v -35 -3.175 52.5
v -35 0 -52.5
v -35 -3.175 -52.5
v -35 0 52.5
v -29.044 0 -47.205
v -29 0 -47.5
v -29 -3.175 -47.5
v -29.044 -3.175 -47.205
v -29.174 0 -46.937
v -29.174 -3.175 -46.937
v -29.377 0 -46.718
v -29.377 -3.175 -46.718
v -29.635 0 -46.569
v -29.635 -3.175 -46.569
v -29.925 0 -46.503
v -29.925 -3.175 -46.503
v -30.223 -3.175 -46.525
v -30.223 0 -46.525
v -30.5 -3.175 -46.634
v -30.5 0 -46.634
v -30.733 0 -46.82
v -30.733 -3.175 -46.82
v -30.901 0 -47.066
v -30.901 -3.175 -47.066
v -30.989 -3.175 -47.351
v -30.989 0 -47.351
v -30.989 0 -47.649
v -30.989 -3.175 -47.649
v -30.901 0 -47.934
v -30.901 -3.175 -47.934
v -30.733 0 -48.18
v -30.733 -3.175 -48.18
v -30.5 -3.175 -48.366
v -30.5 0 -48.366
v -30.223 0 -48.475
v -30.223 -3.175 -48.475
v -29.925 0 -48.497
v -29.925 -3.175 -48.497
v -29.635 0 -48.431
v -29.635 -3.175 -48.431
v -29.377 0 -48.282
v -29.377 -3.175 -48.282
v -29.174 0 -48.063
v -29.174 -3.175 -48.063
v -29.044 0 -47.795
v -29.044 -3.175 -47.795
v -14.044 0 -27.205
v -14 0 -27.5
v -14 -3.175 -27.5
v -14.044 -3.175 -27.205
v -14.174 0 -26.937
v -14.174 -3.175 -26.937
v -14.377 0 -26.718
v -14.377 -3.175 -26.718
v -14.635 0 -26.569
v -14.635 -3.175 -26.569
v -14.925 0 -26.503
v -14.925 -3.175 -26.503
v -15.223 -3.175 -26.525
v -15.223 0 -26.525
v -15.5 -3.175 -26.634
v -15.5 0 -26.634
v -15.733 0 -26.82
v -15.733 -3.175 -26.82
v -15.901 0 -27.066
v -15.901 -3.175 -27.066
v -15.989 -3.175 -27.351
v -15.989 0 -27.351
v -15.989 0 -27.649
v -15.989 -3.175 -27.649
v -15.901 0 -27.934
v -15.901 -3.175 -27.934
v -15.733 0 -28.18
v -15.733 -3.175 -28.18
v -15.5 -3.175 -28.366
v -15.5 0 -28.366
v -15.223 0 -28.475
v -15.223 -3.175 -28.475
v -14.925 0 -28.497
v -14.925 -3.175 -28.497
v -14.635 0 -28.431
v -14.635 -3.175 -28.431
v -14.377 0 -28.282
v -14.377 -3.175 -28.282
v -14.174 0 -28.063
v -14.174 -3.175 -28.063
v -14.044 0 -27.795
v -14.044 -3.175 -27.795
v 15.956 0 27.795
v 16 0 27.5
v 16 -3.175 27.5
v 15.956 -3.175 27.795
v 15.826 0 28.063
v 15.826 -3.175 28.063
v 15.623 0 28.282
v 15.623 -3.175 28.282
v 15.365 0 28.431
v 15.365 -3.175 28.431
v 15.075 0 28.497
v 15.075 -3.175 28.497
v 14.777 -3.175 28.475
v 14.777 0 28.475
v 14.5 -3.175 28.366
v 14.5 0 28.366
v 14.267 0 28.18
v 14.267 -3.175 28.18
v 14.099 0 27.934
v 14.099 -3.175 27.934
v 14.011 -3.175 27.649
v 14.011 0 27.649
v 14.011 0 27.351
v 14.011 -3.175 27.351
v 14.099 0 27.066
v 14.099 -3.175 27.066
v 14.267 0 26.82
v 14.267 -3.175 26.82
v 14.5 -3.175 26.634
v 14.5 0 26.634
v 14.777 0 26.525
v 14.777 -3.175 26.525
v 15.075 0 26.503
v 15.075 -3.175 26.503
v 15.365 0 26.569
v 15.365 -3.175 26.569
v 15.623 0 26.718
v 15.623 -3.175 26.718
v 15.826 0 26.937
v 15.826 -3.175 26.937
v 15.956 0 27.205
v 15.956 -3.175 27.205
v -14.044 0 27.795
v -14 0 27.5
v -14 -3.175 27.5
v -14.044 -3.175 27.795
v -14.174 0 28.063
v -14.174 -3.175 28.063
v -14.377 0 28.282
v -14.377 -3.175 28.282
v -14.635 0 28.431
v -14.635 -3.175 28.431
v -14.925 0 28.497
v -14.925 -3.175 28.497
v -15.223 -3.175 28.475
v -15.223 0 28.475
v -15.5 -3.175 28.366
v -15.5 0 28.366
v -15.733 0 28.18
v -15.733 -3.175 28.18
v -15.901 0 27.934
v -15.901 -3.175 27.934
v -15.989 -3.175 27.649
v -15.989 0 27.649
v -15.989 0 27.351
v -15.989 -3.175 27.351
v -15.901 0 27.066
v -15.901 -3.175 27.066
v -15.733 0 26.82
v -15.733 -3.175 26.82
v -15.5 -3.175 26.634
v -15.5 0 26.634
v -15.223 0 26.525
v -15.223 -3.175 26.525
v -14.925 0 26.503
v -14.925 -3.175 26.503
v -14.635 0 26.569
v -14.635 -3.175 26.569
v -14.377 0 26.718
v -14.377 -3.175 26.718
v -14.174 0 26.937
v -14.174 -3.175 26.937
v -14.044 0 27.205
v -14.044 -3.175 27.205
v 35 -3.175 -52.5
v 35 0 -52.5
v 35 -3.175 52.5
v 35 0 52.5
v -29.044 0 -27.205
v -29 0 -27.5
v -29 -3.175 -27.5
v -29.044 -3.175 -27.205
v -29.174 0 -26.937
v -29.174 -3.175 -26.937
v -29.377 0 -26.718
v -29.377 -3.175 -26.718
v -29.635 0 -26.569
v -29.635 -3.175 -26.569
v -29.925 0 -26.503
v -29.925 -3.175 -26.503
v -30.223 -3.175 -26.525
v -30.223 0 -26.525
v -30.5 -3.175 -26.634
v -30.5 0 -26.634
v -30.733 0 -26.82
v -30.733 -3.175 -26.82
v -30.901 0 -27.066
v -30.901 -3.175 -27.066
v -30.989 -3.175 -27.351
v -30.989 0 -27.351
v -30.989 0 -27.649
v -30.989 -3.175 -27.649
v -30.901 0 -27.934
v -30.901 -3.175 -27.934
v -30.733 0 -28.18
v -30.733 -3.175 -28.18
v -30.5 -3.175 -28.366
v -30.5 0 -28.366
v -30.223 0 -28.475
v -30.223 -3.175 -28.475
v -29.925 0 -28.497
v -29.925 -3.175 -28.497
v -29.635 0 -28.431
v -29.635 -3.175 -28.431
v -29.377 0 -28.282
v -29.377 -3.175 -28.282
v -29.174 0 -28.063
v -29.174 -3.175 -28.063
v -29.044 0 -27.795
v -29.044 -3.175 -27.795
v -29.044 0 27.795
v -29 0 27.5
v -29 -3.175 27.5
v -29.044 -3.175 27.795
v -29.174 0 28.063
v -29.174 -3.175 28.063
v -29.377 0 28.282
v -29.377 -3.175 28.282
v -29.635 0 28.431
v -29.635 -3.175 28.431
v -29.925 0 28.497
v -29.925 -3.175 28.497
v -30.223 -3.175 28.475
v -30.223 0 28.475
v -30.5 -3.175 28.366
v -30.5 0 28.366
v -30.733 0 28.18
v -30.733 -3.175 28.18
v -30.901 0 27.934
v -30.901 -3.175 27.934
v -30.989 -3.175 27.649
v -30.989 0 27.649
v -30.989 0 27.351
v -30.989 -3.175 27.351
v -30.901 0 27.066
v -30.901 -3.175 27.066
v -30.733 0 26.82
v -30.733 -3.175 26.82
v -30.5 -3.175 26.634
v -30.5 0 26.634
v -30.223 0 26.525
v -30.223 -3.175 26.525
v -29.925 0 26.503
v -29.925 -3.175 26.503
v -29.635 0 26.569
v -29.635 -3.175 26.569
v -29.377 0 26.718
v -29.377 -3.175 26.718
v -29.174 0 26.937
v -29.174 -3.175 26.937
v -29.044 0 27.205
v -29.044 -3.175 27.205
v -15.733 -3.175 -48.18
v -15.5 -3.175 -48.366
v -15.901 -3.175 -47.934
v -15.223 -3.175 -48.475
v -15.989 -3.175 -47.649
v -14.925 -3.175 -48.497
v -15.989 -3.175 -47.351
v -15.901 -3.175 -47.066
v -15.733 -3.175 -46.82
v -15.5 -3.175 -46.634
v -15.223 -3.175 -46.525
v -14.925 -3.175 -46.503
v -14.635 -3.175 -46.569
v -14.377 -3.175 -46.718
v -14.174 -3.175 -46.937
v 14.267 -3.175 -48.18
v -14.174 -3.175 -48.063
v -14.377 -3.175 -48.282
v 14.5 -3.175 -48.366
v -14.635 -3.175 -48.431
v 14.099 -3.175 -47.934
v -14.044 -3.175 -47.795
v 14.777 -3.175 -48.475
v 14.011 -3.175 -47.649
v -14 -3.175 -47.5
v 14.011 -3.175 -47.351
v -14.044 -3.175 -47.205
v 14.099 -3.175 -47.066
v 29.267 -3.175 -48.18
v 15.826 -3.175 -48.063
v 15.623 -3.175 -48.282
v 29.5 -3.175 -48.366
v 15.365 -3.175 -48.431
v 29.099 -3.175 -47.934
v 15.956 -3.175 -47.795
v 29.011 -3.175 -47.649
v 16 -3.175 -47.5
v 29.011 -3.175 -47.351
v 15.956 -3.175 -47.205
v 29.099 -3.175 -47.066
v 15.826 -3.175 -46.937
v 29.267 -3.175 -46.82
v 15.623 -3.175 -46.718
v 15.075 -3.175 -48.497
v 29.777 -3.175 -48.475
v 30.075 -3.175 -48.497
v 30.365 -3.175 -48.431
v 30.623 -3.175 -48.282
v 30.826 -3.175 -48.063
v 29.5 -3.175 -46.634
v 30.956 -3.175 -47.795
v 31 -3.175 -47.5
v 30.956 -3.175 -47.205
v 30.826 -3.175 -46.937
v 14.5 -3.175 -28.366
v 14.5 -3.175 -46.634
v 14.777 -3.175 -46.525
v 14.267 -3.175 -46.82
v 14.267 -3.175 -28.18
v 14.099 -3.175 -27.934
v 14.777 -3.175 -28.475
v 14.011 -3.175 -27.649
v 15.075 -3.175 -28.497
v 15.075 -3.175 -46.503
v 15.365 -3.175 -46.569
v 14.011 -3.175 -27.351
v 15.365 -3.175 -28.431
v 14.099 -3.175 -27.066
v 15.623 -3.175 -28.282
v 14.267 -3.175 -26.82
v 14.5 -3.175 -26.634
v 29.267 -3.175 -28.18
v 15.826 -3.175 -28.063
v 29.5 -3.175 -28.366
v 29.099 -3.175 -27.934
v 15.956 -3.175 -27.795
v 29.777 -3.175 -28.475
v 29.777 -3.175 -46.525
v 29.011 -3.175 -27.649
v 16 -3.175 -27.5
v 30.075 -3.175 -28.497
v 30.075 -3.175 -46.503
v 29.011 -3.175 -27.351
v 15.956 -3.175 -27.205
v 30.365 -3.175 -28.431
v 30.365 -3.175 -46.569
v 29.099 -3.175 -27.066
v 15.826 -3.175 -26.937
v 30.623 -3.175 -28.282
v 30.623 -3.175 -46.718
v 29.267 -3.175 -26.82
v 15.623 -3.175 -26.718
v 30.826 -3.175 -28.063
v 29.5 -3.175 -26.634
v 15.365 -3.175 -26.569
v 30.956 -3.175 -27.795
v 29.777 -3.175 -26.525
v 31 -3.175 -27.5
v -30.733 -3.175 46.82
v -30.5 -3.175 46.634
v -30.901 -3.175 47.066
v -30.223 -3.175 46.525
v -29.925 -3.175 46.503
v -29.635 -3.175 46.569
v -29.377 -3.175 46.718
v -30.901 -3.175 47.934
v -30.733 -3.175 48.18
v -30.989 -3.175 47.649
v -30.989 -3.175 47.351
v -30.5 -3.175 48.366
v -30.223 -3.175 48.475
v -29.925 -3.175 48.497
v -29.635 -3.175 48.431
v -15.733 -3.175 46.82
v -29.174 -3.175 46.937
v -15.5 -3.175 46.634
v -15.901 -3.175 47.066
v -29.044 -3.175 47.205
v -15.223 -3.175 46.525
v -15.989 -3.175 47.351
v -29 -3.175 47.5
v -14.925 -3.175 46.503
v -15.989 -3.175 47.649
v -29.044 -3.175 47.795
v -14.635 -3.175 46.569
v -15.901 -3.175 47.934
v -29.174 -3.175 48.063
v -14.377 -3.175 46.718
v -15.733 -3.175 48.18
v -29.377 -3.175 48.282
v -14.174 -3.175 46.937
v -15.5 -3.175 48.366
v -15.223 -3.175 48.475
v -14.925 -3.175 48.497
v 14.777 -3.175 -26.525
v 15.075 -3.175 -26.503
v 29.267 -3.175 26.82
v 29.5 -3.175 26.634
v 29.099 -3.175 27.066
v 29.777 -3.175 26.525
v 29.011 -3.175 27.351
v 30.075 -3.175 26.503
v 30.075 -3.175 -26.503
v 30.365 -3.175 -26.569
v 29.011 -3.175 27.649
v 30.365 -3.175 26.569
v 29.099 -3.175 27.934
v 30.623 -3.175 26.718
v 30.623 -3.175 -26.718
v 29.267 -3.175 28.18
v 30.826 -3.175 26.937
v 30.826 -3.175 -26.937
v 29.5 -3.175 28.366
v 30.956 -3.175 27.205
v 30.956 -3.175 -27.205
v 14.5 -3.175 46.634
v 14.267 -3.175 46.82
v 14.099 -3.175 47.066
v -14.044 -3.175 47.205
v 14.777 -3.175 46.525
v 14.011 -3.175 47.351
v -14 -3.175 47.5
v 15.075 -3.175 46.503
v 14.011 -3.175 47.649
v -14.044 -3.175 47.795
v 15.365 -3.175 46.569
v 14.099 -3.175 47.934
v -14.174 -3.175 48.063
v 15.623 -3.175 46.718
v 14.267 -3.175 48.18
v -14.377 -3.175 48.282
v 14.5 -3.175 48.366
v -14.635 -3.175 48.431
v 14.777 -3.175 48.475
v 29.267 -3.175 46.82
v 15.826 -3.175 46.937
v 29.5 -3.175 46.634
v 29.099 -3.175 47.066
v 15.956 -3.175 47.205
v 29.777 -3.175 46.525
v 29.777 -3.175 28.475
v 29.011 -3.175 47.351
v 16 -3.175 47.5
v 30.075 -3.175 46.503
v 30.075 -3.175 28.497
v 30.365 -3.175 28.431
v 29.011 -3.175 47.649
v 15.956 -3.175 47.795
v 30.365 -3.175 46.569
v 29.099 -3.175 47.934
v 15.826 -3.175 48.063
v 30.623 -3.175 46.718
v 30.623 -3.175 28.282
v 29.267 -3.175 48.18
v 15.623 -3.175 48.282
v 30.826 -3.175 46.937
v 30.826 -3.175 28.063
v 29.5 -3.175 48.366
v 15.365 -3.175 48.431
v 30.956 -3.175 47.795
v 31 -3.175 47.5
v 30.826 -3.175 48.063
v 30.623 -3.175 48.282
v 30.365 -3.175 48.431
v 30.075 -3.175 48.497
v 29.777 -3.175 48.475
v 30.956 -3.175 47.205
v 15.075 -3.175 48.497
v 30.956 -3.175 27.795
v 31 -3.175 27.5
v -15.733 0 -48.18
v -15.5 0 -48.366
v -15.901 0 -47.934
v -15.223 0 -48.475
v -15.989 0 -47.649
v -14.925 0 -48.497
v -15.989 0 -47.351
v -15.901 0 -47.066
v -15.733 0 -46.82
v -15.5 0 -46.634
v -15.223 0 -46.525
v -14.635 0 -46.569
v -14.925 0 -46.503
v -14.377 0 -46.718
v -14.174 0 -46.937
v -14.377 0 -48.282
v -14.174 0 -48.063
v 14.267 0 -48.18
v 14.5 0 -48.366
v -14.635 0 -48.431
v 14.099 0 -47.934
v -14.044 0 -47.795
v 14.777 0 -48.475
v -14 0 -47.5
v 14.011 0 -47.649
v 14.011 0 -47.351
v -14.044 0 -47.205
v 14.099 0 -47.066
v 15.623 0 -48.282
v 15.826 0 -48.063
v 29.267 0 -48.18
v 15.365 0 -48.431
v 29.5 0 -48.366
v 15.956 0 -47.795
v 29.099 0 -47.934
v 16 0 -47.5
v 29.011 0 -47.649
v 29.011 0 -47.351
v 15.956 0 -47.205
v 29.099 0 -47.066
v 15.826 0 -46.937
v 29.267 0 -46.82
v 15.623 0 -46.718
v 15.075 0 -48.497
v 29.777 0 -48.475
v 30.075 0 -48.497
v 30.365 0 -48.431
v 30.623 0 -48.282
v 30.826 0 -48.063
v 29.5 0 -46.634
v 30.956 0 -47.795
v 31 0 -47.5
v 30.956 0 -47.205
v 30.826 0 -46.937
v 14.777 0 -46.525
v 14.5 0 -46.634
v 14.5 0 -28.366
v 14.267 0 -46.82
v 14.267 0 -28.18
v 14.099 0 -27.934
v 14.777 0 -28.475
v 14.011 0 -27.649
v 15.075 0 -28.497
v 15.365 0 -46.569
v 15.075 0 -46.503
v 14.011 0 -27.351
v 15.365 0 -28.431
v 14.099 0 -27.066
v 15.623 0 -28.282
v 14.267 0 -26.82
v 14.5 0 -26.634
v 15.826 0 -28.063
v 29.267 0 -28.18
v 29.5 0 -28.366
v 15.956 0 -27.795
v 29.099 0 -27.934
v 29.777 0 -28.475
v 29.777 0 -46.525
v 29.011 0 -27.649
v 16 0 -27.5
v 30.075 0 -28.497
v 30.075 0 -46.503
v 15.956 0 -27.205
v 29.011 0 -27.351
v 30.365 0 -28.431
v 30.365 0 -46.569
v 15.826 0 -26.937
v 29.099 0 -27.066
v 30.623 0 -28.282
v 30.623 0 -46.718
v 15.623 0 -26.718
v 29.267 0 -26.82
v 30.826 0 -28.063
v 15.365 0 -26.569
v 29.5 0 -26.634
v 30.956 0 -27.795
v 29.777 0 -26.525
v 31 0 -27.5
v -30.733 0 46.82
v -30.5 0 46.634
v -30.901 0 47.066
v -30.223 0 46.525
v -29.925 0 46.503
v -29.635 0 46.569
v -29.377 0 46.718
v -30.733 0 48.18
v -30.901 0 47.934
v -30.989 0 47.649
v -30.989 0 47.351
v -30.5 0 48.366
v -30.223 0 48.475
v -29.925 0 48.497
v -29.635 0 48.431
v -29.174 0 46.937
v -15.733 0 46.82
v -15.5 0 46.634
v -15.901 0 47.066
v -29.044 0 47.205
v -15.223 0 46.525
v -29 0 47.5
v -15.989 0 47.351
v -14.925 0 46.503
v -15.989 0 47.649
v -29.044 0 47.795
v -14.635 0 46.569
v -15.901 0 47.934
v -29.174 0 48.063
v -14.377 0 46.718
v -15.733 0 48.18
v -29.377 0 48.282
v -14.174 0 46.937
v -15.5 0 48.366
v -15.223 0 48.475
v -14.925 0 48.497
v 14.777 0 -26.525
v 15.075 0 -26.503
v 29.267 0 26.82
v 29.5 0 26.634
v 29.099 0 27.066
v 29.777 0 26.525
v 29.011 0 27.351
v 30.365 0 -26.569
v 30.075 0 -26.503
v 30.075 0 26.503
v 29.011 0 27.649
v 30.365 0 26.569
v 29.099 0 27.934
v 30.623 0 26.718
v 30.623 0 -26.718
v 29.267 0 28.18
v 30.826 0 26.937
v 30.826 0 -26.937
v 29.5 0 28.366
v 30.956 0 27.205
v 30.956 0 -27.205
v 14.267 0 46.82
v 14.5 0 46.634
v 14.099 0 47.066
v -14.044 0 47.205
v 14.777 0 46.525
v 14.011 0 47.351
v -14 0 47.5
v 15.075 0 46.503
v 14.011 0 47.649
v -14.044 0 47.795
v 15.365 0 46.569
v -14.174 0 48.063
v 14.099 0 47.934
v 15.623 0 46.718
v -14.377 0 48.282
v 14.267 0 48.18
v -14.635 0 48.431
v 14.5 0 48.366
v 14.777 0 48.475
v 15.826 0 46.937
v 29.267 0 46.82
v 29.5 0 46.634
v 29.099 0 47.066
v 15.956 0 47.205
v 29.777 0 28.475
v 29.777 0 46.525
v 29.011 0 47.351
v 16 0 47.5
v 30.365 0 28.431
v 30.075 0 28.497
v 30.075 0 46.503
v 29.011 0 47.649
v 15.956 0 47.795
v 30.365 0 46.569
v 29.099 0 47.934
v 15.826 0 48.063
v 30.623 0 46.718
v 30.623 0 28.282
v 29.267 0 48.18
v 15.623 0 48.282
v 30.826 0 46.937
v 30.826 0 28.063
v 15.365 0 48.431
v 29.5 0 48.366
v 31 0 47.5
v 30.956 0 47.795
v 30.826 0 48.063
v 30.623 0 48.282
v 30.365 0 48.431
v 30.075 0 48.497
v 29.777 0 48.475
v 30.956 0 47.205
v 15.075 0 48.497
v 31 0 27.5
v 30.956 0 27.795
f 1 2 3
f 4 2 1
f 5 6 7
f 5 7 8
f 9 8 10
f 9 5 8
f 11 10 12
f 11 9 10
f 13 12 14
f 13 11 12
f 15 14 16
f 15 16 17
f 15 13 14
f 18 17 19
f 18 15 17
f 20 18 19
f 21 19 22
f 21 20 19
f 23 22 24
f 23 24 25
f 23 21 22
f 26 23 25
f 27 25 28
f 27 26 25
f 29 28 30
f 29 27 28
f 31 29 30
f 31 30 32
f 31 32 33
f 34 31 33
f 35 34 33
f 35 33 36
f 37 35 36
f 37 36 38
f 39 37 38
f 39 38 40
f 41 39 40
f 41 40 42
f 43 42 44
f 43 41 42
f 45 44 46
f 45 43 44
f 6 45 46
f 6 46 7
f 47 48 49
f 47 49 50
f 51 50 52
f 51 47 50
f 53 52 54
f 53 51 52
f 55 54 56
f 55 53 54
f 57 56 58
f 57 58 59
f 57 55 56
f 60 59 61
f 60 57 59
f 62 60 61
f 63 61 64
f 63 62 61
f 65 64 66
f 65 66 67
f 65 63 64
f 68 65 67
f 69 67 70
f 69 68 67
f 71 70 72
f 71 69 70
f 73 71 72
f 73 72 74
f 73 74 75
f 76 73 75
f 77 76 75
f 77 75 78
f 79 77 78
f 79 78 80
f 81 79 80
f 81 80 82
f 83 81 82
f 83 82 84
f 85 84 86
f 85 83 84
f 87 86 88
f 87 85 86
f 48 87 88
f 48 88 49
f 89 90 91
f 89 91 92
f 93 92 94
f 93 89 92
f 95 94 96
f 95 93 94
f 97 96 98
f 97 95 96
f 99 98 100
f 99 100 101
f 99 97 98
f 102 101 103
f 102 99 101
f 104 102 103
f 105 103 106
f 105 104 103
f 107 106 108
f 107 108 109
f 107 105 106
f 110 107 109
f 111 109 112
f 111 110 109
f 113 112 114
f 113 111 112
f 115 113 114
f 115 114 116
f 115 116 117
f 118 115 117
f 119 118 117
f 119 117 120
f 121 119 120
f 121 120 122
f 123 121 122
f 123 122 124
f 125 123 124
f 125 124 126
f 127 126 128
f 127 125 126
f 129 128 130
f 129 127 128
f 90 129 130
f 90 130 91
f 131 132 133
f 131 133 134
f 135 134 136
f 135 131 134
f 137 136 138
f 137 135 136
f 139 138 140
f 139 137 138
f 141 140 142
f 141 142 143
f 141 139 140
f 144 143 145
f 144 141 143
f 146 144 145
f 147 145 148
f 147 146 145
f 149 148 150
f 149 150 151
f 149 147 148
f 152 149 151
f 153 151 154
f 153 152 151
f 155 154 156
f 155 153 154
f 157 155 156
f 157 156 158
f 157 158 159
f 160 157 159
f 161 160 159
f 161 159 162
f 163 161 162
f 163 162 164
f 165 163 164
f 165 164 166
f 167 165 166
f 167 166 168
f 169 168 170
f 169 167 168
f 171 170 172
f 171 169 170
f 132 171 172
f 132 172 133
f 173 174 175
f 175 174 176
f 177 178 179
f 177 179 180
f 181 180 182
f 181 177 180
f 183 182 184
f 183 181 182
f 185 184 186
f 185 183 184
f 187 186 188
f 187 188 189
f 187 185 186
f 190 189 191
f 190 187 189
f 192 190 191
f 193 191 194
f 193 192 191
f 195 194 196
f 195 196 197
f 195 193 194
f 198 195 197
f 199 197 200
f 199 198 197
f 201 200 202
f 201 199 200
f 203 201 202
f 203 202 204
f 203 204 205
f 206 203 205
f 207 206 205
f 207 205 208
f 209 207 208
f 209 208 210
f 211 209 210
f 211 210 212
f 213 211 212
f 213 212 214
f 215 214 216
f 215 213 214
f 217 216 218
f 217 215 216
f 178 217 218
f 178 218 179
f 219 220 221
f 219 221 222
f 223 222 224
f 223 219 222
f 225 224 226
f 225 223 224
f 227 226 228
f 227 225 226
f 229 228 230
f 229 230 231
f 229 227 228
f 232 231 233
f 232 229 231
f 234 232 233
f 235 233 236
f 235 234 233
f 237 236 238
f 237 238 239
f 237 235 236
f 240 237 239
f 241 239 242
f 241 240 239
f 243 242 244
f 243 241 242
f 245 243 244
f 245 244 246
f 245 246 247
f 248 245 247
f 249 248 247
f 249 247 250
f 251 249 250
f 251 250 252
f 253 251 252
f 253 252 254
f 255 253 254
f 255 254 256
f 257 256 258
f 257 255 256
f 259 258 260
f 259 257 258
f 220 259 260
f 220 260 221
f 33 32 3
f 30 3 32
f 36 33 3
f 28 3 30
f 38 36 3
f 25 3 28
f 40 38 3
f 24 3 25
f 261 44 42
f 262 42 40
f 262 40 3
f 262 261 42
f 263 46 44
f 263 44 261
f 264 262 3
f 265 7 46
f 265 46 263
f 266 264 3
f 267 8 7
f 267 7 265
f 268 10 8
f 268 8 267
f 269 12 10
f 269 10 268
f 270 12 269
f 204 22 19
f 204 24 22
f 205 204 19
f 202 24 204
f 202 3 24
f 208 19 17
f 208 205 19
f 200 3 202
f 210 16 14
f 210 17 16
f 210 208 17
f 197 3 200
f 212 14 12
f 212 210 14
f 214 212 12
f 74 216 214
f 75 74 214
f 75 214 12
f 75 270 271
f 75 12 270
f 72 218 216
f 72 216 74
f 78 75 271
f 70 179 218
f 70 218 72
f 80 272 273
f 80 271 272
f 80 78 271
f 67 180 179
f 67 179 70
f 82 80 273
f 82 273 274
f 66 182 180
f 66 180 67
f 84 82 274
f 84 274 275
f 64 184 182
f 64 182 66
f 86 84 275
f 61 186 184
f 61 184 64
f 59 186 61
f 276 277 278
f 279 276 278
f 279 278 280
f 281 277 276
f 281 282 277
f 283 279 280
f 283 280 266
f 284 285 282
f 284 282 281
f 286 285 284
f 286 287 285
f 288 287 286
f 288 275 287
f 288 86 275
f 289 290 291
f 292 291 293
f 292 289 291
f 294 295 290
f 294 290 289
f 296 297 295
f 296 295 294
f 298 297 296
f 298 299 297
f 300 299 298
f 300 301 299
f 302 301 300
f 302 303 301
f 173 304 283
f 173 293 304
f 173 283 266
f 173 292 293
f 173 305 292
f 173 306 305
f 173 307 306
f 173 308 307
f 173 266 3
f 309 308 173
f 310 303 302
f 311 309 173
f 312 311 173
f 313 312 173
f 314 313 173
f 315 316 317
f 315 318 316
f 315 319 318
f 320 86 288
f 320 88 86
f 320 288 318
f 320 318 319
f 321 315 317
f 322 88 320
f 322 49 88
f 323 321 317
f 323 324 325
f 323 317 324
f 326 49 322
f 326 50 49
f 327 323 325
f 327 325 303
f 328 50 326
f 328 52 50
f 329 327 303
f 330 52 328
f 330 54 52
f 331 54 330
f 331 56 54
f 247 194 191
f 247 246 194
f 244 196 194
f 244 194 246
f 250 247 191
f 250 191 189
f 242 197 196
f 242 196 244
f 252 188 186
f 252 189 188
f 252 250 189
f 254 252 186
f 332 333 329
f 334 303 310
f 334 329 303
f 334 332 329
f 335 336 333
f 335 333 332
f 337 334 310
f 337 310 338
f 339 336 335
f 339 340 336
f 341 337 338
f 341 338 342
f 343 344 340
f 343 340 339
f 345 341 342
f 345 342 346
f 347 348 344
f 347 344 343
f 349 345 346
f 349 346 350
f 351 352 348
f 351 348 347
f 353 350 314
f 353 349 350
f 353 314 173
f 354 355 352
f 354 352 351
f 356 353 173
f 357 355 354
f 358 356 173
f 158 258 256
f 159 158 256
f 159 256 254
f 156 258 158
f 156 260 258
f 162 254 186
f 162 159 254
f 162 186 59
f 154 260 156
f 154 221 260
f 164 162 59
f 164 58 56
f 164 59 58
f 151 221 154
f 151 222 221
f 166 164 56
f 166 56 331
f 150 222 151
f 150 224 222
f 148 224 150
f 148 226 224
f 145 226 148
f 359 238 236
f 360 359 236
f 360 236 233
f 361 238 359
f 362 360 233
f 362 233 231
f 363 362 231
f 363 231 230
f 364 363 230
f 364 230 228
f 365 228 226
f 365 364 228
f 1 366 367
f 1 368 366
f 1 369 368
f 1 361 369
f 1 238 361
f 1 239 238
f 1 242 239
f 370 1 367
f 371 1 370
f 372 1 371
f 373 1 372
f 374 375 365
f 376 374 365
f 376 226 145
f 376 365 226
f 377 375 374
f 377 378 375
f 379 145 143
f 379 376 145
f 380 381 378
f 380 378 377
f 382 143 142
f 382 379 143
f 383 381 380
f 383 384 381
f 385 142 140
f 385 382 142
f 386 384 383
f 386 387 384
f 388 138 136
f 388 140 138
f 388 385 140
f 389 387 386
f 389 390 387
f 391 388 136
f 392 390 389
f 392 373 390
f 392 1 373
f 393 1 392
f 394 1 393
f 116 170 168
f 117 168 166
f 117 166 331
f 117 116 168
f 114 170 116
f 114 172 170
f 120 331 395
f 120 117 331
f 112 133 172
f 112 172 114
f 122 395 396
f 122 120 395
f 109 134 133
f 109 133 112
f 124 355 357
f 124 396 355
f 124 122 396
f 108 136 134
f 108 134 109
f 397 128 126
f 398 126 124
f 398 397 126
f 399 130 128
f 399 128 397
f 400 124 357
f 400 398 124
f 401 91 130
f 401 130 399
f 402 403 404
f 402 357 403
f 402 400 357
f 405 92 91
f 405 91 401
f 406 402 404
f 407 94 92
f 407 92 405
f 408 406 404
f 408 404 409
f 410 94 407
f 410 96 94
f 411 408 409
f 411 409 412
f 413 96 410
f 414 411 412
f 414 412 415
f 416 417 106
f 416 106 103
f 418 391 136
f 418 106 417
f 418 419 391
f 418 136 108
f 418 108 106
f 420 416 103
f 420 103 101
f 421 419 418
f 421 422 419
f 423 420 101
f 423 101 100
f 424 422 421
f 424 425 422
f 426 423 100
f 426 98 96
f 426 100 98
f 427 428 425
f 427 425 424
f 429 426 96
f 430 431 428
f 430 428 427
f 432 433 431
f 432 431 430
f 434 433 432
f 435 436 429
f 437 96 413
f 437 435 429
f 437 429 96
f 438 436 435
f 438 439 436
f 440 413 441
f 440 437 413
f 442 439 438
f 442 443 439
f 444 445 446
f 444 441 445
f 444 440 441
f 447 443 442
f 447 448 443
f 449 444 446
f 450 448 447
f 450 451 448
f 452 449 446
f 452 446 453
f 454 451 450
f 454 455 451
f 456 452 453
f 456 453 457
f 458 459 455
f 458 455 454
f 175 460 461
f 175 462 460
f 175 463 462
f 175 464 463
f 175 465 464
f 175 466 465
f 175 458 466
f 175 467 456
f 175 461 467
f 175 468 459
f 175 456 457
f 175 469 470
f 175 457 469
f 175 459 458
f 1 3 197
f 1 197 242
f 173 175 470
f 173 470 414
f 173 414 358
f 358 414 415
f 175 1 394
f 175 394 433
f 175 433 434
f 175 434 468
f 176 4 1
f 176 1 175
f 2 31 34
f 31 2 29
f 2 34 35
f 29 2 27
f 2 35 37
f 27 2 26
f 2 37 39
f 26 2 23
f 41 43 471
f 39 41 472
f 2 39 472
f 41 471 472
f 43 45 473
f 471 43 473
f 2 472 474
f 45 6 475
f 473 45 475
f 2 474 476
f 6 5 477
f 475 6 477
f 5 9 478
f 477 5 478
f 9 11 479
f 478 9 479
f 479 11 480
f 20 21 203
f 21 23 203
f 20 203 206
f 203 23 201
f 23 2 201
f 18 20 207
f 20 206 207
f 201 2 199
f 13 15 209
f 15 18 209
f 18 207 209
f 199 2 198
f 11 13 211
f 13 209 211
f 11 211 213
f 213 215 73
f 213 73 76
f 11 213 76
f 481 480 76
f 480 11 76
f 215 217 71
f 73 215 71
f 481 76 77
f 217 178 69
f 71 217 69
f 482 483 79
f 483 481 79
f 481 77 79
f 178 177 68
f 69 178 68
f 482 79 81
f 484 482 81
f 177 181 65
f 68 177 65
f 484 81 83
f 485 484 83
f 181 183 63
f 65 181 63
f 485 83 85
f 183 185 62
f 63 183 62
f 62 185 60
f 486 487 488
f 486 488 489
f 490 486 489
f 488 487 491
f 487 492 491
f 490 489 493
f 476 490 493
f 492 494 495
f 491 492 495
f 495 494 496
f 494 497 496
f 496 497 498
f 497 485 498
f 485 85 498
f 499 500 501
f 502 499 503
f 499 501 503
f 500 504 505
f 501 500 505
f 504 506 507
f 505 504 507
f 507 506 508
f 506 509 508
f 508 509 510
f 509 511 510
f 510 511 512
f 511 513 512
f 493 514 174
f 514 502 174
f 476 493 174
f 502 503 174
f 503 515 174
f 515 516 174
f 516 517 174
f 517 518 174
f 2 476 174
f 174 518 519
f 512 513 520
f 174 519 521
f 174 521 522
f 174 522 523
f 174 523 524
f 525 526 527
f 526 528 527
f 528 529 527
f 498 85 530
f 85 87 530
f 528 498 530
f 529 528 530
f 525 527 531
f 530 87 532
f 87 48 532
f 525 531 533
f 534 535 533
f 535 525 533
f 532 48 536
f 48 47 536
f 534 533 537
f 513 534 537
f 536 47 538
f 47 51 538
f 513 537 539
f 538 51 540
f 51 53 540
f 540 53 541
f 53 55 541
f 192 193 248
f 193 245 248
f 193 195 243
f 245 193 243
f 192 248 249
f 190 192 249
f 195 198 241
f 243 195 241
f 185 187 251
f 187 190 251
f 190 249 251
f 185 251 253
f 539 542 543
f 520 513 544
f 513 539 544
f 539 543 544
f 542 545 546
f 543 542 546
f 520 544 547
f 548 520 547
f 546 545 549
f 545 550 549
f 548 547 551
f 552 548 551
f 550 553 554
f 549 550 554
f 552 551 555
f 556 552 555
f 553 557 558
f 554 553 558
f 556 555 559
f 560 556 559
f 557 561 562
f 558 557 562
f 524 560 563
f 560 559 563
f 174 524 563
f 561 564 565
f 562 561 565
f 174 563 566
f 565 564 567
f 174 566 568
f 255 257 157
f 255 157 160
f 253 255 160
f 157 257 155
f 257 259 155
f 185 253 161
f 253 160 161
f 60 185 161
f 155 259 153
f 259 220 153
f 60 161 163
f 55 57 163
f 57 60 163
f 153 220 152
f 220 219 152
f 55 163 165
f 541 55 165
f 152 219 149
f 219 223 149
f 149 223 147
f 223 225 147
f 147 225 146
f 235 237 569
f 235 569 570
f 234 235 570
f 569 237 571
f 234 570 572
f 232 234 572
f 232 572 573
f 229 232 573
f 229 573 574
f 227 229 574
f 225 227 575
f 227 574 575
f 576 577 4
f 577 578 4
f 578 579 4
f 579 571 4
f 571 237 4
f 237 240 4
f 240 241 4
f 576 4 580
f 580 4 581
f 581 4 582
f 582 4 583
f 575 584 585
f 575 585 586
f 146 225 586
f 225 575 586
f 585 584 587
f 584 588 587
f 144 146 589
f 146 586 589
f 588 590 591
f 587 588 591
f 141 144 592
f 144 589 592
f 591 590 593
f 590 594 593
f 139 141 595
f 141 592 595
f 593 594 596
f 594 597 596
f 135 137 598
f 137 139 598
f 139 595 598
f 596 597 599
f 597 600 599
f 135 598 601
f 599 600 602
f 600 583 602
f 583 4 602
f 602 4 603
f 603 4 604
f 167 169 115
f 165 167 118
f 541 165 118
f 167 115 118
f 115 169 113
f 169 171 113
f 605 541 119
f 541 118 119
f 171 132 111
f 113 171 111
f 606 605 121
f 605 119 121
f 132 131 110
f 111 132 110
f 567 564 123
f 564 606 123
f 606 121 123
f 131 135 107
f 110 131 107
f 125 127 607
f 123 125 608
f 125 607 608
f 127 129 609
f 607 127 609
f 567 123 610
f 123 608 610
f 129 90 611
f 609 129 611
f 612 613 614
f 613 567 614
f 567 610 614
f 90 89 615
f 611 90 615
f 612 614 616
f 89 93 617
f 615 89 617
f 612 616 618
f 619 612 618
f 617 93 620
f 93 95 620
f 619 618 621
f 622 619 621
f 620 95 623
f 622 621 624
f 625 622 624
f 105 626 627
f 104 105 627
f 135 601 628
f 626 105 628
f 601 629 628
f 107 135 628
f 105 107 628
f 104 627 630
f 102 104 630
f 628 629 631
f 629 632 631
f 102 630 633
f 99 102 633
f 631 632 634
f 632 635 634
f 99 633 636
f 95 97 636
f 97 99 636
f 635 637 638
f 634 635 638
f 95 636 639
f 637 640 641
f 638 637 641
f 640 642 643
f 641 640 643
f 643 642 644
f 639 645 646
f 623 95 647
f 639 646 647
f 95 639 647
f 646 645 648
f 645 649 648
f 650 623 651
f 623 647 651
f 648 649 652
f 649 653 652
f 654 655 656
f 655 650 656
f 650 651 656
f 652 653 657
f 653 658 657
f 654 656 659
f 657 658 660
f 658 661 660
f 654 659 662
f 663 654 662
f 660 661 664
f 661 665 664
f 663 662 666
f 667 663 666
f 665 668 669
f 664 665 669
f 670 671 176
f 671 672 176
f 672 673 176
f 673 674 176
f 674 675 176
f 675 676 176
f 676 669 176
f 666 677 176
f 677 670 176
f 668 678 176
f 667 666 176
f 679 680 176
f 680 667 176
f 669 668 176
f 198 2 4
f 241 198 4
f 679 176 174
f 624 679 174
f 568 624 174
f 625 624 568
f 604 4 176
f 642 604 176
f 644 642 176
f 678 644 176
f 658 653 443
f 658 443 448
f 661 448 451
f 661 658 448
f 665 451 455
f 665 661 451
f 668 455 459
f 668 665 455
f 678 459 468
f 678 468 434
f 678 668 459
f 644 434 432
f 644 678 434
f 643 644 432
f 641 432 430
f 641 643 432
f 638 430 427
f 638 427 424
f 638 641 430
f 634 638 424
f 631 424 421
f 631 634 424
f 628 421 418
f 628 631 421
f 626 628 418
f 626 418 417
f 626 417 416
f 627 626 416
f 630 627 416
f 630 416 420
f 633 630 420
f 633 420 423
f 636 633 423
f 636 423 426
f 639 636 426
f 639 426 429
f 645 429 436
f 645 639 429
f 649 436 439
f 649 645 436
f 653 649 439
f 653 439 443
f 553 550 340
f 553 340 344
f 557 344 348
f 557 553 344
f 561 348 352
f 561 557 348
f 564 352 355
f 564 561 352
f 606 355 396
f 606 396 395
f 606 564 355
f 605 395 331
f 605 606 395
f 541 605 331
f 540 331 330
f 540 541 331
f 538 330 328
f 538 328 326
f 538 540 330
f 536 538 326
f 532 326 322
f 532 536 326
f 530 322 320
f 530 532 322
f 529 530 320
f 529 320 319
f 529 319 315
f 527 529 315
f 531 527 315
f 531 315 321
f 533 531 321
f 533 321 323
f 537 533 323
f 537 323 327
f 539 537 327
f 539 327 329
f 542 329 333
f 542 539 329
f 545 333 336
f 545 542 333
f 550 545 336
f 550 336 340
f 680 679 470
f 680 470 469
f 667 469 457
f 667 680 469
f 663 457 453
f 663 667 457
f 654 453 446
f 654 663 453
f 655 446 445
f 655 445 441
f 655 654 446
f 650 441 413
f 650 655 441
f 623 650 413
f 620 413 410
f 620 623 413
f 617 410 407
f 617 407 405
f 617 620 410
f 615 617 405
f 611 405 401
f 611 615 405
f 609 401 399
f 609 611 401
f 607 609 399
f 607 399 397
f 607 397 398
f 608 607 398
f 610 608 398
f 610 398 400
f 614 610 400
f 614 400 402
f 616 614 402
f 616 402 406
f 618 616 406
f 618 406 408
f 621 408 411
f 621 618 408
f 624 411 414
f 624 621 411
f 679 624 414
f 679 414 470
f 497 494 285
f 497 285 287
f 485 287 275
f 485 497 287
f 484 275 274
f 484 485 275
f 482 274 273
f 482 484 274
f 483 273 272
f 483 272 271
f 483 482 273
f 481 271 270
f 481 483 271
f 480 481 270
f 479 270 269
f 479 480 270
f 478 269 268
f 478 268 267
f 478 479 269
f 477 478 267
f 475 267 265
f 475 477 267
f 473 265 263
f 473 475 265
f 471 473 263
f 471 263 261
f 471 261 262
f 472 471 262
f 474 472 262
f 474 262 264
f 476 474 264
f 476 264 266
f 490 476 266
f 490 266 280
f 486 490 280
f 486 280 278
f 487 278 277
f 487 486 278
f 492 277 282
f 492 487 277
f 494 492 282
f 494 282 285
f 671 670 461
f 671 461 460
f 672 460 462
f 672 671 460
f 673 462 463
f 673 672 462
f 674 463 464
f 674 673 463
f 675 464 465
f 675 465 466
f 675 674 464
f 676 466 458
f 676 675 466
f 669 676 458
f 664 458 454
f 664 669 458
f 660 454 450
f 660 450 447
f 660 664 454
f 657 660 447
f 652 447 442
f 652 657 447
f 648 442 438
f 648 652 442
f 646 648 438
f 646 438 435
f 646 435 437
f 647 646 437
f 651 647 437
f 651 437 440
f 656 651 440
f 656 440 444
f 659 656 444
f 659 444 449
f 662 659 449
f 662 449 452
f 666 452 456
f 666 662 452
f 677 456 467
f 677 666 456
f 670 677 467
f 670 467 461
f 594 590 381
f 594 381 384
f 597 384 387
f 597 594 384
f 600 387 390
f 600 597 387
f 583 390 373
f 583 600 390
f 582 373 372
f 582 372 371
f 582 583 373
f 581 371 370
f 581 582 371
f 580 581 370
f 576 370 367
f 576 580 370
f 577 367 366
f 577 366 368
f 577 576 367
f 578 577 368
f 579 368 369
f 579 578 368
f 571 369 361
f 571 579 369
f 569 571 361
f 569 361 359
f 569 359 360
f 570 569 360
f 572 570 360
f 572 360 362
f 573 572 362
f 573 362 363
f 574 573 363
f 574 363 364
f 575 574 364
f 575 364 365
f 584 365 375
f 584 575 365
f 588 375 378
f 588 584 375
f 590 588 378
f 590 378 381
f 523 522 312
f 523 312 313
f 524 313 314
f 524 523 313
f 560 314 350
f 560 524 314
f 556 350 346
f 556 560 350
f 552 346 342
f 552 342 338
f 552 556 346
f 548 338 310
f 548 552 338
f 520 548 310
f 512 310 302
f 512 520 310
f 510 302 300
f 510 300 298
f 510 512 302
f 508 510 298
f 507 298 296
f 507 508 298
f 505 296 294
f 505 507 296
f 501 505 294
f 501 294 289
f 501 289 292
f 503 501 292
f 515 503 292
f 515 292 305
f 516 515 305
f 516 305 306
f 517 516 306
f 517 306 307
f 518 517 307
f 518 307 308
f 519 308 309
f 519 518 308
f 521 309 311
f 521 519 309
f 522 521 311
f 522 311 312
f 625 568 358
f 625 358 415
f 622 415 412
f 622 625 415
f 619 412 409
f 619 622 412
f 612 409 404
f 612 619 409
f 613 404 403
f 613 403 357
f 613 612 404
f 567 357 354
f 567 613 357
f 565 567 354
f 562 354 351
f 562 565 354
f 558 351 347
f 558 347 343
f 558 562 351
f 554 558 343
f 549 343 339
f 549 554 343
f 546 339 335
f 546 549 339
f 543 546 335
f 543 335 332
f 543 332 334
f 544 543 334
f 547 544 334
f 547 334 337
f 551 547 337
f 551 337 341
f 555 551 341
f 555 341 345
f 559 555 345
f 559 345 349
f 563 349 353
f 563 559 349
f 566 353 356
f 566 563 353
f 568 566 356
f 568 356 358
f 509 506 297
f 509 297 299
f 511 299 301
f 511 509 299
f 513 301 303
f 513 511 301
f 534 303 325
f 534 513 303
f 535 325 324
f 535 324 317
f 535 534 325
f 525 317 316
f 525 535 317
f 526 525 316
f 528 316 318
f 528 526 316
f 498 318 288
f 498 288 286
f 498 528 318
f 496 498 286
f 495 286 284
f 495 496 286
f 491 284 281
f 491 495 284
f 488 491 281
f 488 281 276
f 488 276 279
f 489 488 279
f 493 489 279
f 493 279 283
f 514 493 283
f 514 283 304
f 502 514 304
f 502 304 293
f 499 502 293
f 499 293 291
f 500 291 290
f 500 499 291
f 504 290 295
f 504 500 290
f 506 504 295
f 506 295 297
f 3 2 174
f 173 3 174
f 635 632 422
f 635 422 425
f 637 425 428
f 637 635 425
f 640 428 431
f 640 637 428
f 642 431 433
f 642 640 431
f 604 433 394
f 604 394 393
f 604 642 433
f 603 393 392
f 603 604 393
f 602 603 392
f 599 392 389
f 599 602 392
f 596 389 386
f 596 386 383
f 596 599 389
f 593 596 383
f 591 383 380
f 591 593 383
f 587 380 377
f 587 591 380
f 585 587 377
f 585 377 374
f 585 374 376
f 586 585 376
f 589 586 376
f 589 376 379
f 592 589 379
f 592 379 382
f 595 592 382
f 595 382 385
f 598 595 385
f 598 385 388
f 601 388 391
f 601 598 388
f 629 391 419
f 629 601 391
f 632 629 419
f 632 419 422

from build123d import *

# Parameters (mm, degrees)
F0_W     = 70
F0_H     = 105
F0_R     = 1
F1_DEPTH = 3.175


with BuildPart() as f1:
    # F0 (on Front) → F1 (new body)
    with BuildSketch(Plane.XZ):
        Rectangle(F0_W, F0_H)
        with Locations((-30, -47.5)):
            Circle(F0_R, mode=Mode.SUBTRACT)
        with Locations((-30, -27.5)):
            Circle(F0_R, mode=Mode.SUBTRACT)
        with Locations((-15, -47.5)):
            Circle(F0_R, mode=Mode.SUBTRACT)
        with Locations((-15, -27.5)):
            Circle(F0_R, mode=Mode.SUBTRACT)
        with Locations((15, -47.5)):
            Circle(F0_R, mode=Mode.SUBTRACT)
        with Locations((15, -27.5)):
            Circle(F0_R, mode=Mode.SUBTRACT)
        with Locations((30, -47.5)):
            Circle(F0_R, mode=Mode.SUBTRACT)
        with Locations((30, -27.5)):
            Circle(F0_R, mode=Mode.SUBTRACT)
        with Locations((-30, 27.5)):
            Circle(F0_R, mode=Mode.SUBTRACT)
        with Locations((-30, 47.5)):
            Circle(F0_R, mode=Mode.SUBTRACT)
        with Locations((-15, 27.5)):
            Circle(F0_R, mode=Mode.SUBTRACT)
        with Locations((-15, 47.5)):
            Circle(F0_R, mode=Mode.SUBTRACT)
        with Locations((15, 27.5)):
            Circle(F0_R, mode=Mode.SUBTRACT)
        with Locations((15, 47.5)):
            Circle(F0_R, mode=Mode.SUBTRACT)
        with Locations((30, 27.5)):
            Circle(F0_R, mode=Mode.SUBTRACT)
        with Locations((30, 47.5)):
            Circle(F0_R, mode=Mode.SUBTRACT)
    extrude(amount=F1_DEPTH)


solid = f1.part
